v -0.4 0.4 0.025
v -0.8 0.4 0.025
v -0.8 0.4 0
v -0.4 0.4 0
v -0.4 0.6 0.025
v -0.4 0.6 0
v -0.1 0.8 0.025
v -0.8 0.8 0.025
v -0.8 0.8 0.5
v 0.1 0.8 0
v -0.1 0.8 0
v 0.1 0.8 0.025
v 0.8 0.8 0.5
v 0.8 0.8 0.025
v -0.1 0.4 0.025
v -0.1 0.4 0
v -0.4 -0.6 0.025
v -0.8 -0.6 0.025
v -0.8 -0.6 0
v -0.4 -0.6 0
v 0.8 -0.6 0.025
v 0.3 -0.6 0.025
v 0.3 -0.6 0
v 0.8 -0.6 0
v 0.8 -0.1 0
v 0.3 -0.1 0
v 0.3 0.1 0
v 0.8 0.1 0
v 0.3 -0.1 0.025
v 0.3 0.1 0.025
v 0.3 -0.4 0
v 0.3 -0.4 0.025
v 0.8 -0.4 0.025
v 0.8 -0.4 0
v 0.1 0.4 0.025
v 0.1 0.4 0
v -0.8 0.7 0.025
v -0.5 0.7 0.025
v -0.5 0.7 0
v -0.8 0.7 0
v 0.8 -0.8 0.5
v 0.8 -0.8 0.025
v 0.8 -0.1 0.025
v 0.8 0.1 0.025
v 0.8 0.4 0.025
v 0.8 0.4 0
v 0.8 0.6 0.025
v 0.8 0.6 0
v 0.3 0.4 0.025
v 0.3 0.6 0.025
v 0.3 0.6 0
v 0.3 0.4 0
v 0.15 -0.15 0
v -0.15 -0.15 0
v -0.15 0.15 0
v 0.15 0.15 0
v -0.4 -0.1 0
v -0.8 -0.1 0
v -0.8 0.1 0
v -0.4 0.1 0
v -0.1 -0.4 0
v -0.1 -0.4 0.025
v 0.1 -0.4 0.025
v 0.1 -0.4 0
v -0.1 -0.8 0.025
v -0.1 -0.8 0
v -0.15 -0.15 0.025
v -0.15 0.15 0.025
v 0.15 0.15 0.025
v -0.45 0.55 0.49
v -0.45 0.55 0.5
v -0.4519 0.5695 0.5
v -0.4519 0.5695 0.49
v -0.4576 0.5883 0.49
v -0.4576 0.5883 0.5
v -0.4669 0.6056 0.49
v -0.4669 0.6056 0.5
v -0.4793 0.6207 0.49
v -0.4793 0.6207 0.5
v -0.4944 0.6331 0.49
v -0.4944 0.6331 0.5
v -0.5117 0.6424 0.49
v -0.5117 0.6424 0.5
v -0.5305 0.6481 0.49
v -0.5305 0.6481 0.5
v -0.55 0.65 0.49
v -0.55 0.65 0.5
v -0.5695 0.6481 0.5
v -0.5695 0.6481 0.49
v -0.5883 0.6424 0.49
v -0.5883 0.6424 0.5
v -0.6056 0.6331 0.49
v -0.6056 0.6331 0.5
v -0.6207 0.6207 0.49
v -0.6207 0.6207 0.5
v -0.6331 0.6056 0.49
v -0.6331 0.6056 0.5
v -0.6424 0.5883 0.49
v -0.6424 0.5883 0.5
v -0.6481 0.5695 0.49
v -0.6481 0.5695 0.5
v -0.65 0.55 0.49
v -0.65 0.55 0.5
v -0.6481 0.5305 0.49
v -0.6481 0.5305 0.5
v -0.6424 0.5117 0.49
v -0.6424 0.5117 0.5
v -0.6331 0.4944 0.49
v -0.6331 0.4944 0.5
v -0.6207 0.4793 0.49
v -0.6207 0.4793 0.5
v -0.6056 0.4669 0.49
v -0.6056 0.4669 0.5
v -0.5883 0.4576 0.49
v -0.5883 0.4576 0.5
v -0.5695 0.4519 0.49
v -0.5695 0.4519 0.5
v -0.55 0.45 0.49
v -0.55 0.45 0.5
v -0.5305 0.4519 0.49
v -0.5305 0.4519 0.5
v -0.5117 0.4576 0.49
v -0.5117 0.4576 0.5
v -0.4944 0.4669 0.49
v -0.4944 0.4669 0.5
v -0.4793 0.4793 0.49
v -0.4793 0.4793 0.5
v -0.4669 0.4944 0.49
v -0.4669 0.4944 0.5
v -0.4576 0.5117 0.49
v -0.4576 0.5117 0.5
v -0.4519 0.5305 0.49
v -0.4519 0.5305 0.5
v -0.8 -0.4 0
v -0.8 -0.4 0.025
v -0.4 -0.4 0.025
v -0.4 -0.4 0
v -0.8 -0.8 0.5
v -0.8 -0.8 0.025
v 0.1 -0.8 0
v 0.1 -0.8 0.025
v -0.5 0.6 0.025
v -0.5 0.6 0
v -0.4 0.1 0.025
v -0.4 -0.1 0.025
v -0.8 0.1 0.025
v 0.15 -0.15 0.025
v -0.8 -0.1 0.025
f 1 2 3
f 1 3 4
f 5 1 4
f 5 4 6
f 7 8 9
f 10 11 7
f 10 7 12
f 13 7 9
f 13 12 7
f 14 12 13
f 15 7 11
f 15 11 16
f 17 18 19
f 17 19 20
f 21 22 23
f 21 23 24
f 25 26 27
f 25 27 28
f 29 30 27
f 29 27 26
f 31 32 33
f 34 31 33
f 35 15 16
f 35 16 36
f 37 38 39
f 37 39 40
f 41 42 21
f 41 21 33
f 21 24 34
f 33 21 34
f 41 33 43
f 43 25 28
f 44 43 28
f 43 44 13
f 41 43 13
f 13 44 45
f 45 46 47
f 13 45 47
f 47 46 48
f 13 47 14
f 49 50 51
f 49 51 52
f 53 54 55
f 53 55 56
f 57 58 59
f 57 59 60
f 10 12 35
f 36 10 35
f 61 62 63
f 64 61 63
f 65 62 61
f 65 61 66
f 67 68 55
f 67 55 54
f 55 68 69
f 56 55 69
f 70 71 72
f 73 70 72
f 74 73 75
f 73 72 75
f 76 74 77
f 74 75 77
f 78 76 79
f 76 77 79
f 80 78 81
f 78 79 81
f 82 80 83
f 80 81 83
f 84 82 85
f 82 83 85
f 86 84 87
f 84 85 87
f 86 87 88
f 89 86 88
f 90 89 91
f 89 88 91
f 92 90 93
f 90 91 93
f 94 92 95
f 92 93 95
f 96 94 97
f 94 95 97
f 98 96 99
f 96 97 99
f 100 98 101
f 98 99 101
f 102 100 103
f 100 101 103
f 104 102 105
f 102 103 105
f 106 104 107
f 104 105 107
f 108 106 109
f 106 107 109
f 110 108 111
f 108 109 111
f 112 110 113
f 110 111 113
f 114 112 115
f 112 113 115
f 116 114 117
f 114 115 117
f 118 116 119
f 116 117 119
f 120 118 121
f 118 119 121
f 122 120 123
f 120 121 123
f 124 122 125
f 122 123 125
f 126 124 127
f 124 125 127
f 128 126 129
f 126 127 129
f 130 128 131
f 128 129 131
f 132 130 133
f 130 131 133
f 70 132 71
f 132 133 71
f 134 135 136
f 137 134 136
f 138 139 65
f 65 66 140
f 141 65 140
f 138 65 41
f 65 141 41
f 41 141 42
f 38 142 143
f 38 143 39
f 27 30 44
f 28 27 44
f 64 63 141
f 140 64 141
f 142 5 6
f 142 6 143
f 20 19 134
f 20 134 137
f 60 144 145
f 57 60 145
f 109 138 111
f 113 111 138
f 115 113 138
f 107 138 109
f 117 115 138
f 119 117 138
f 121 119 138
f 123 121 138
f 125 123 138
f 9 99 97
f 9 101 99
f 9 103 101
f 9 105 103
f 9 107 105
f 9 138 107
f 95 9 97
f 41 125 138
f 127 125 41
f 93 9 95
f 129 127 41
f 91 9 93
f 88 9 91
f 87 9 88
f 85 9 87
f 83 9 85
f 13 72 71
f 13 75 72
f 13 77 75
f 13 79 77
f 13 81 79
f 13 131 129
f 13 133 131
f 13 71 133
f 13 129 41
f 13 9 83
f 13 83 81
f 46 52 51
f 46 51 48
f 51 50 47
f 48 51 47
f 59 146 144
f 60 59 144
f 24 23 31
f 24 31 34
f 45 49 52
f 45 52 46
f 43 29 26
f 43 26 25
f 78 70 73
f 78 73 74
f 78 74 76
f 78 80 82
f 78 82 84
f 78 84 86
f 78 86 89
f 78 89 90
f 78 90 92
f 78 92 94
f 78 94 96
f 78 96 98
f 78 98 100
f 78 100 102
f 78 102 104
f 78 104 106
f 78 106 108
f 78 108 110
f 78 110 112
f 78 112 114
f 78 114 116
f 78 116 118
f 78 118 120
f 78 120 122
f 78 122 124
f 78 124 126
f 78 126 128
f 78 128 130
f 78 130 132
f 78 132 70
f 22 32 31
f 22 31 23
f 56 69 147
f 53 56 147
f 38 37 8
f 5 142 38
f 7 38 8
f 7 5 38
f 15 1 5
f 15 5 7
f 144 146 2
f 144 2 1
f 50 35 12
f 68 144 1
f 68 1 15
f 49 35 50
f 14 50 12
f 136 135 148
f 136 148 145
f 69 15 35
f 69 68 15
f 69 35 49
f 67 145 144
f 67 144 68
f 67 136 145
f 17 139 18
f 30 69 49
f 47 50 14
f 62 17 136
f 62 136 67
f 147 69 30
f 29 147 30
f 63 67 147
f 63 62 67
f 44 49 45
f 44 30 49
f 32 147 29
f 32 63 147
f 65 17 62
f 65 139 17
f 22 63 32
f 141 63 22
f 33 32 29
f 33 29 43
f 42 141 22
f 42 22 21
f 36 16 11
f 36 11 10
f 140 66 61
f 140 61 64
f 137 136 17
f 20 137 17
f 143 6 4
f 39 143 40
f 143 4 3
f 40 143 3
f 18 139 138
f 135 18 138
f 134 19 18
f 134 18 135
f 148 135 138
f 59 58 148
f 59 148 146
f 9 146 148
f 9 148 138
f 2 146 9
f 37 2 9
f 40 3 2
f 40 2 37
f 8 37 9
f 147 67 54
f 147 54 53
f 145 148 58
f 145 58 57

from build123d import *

# Parameters (mm, degrees)
SKETCH_W        = 1.6
SKETCH_H        = 1.6
PAD_DEPTH       = 0.5
SKETCH001_W     = 1.6
SKETCH001_H     = 1.6
POCKET_DEPTH    = 0.025
SKETCH002_W     = 0.4
SKETCH002_H     = 0.2
SKETCH002_W_2   = 0.5
SKETCH002_W_3   = 0.2
SKETCH002_H_2   = 0.4
SKETCH002_W_4   = 0.3
SKETCH002_H_3   = 0.3
PAD001_DEPTH    = 0.025
SKETCH003_R     = 0.1
POCKET001_DEPTH = 0.01


with BuildPart() as part:
    # Sketch → Pad (new body)
    with BuildSketch(Plane.XY):
        Rectangle(SKETCH_W, SKETCH_H)
    extrude(amount=PAD_DEPTH)

    # Sketch001 → Pocket (cut)
    with BuildSketch(Plane(origin=(0, 0, 0), x_dir=(1, 0, 0), z_dir=(0, 0, -1))):
        Rectangle(SKETCH001_W, SKETCH001_H)
    extrude(amount=-POCKET_DEPTH, mode=Mode.SUBTRACT)

    # Sketch002 → Pad001 (new body)
    with BuildSketch(Plane(origin=(0, 0, 0.025), x_dir=(1, 0, 0), z_dir=(0, 0, -1))):
        with Locations((-0.6, 0.5)):
            Rectangle(SKETCH002_W, SKETCH002_H)
        with Locations((-0.6, 0)):
            Rectangle(SKETCH002_W, SKETCH002_H)
        Polygon((-0.8, -0.4), (-0.4, -0.4), (-0.4, -0.6), (-0.5, -0.6), (-0.5, -0.7), (-0.8, -0.7), align=None)
        with Locations((0.55, 0.5)):
            Rectangle(SKETCH002_W_2, SKETCH002_H)
        with Locations((0.55, 0)):
            Rectangle(SKETCH002_W_2, SKETCH002_H)
        with Locations((0.55, -0.5)):
            Rectangle(SKETCH002_W_2, SKETCH002_H)
        with Locations((0, -0.6)):
            Rectangle(SKETCH002_W_3, SKETCH002_H_2)
        with Locations((0, 0.6)):
            Rectangle(SKETCH002_W_3, SKETCH002_H_2)
        Rectangle(SKETCH002_W_4, SKETCH002_H_3)
    extrude(amount=PAD001_DEPTH)

    # Sketch003 → Pocket001 (cut)
    with BuildSketch(Plane.XY.offset(0.5)):
        with Locations((-0.55, 0.55)):
            Circle(SKETCH003_R)
    extrude(amount=-POCKET001_DEPTH, mode=Mode.SUBTRACT)


solid = part.part
